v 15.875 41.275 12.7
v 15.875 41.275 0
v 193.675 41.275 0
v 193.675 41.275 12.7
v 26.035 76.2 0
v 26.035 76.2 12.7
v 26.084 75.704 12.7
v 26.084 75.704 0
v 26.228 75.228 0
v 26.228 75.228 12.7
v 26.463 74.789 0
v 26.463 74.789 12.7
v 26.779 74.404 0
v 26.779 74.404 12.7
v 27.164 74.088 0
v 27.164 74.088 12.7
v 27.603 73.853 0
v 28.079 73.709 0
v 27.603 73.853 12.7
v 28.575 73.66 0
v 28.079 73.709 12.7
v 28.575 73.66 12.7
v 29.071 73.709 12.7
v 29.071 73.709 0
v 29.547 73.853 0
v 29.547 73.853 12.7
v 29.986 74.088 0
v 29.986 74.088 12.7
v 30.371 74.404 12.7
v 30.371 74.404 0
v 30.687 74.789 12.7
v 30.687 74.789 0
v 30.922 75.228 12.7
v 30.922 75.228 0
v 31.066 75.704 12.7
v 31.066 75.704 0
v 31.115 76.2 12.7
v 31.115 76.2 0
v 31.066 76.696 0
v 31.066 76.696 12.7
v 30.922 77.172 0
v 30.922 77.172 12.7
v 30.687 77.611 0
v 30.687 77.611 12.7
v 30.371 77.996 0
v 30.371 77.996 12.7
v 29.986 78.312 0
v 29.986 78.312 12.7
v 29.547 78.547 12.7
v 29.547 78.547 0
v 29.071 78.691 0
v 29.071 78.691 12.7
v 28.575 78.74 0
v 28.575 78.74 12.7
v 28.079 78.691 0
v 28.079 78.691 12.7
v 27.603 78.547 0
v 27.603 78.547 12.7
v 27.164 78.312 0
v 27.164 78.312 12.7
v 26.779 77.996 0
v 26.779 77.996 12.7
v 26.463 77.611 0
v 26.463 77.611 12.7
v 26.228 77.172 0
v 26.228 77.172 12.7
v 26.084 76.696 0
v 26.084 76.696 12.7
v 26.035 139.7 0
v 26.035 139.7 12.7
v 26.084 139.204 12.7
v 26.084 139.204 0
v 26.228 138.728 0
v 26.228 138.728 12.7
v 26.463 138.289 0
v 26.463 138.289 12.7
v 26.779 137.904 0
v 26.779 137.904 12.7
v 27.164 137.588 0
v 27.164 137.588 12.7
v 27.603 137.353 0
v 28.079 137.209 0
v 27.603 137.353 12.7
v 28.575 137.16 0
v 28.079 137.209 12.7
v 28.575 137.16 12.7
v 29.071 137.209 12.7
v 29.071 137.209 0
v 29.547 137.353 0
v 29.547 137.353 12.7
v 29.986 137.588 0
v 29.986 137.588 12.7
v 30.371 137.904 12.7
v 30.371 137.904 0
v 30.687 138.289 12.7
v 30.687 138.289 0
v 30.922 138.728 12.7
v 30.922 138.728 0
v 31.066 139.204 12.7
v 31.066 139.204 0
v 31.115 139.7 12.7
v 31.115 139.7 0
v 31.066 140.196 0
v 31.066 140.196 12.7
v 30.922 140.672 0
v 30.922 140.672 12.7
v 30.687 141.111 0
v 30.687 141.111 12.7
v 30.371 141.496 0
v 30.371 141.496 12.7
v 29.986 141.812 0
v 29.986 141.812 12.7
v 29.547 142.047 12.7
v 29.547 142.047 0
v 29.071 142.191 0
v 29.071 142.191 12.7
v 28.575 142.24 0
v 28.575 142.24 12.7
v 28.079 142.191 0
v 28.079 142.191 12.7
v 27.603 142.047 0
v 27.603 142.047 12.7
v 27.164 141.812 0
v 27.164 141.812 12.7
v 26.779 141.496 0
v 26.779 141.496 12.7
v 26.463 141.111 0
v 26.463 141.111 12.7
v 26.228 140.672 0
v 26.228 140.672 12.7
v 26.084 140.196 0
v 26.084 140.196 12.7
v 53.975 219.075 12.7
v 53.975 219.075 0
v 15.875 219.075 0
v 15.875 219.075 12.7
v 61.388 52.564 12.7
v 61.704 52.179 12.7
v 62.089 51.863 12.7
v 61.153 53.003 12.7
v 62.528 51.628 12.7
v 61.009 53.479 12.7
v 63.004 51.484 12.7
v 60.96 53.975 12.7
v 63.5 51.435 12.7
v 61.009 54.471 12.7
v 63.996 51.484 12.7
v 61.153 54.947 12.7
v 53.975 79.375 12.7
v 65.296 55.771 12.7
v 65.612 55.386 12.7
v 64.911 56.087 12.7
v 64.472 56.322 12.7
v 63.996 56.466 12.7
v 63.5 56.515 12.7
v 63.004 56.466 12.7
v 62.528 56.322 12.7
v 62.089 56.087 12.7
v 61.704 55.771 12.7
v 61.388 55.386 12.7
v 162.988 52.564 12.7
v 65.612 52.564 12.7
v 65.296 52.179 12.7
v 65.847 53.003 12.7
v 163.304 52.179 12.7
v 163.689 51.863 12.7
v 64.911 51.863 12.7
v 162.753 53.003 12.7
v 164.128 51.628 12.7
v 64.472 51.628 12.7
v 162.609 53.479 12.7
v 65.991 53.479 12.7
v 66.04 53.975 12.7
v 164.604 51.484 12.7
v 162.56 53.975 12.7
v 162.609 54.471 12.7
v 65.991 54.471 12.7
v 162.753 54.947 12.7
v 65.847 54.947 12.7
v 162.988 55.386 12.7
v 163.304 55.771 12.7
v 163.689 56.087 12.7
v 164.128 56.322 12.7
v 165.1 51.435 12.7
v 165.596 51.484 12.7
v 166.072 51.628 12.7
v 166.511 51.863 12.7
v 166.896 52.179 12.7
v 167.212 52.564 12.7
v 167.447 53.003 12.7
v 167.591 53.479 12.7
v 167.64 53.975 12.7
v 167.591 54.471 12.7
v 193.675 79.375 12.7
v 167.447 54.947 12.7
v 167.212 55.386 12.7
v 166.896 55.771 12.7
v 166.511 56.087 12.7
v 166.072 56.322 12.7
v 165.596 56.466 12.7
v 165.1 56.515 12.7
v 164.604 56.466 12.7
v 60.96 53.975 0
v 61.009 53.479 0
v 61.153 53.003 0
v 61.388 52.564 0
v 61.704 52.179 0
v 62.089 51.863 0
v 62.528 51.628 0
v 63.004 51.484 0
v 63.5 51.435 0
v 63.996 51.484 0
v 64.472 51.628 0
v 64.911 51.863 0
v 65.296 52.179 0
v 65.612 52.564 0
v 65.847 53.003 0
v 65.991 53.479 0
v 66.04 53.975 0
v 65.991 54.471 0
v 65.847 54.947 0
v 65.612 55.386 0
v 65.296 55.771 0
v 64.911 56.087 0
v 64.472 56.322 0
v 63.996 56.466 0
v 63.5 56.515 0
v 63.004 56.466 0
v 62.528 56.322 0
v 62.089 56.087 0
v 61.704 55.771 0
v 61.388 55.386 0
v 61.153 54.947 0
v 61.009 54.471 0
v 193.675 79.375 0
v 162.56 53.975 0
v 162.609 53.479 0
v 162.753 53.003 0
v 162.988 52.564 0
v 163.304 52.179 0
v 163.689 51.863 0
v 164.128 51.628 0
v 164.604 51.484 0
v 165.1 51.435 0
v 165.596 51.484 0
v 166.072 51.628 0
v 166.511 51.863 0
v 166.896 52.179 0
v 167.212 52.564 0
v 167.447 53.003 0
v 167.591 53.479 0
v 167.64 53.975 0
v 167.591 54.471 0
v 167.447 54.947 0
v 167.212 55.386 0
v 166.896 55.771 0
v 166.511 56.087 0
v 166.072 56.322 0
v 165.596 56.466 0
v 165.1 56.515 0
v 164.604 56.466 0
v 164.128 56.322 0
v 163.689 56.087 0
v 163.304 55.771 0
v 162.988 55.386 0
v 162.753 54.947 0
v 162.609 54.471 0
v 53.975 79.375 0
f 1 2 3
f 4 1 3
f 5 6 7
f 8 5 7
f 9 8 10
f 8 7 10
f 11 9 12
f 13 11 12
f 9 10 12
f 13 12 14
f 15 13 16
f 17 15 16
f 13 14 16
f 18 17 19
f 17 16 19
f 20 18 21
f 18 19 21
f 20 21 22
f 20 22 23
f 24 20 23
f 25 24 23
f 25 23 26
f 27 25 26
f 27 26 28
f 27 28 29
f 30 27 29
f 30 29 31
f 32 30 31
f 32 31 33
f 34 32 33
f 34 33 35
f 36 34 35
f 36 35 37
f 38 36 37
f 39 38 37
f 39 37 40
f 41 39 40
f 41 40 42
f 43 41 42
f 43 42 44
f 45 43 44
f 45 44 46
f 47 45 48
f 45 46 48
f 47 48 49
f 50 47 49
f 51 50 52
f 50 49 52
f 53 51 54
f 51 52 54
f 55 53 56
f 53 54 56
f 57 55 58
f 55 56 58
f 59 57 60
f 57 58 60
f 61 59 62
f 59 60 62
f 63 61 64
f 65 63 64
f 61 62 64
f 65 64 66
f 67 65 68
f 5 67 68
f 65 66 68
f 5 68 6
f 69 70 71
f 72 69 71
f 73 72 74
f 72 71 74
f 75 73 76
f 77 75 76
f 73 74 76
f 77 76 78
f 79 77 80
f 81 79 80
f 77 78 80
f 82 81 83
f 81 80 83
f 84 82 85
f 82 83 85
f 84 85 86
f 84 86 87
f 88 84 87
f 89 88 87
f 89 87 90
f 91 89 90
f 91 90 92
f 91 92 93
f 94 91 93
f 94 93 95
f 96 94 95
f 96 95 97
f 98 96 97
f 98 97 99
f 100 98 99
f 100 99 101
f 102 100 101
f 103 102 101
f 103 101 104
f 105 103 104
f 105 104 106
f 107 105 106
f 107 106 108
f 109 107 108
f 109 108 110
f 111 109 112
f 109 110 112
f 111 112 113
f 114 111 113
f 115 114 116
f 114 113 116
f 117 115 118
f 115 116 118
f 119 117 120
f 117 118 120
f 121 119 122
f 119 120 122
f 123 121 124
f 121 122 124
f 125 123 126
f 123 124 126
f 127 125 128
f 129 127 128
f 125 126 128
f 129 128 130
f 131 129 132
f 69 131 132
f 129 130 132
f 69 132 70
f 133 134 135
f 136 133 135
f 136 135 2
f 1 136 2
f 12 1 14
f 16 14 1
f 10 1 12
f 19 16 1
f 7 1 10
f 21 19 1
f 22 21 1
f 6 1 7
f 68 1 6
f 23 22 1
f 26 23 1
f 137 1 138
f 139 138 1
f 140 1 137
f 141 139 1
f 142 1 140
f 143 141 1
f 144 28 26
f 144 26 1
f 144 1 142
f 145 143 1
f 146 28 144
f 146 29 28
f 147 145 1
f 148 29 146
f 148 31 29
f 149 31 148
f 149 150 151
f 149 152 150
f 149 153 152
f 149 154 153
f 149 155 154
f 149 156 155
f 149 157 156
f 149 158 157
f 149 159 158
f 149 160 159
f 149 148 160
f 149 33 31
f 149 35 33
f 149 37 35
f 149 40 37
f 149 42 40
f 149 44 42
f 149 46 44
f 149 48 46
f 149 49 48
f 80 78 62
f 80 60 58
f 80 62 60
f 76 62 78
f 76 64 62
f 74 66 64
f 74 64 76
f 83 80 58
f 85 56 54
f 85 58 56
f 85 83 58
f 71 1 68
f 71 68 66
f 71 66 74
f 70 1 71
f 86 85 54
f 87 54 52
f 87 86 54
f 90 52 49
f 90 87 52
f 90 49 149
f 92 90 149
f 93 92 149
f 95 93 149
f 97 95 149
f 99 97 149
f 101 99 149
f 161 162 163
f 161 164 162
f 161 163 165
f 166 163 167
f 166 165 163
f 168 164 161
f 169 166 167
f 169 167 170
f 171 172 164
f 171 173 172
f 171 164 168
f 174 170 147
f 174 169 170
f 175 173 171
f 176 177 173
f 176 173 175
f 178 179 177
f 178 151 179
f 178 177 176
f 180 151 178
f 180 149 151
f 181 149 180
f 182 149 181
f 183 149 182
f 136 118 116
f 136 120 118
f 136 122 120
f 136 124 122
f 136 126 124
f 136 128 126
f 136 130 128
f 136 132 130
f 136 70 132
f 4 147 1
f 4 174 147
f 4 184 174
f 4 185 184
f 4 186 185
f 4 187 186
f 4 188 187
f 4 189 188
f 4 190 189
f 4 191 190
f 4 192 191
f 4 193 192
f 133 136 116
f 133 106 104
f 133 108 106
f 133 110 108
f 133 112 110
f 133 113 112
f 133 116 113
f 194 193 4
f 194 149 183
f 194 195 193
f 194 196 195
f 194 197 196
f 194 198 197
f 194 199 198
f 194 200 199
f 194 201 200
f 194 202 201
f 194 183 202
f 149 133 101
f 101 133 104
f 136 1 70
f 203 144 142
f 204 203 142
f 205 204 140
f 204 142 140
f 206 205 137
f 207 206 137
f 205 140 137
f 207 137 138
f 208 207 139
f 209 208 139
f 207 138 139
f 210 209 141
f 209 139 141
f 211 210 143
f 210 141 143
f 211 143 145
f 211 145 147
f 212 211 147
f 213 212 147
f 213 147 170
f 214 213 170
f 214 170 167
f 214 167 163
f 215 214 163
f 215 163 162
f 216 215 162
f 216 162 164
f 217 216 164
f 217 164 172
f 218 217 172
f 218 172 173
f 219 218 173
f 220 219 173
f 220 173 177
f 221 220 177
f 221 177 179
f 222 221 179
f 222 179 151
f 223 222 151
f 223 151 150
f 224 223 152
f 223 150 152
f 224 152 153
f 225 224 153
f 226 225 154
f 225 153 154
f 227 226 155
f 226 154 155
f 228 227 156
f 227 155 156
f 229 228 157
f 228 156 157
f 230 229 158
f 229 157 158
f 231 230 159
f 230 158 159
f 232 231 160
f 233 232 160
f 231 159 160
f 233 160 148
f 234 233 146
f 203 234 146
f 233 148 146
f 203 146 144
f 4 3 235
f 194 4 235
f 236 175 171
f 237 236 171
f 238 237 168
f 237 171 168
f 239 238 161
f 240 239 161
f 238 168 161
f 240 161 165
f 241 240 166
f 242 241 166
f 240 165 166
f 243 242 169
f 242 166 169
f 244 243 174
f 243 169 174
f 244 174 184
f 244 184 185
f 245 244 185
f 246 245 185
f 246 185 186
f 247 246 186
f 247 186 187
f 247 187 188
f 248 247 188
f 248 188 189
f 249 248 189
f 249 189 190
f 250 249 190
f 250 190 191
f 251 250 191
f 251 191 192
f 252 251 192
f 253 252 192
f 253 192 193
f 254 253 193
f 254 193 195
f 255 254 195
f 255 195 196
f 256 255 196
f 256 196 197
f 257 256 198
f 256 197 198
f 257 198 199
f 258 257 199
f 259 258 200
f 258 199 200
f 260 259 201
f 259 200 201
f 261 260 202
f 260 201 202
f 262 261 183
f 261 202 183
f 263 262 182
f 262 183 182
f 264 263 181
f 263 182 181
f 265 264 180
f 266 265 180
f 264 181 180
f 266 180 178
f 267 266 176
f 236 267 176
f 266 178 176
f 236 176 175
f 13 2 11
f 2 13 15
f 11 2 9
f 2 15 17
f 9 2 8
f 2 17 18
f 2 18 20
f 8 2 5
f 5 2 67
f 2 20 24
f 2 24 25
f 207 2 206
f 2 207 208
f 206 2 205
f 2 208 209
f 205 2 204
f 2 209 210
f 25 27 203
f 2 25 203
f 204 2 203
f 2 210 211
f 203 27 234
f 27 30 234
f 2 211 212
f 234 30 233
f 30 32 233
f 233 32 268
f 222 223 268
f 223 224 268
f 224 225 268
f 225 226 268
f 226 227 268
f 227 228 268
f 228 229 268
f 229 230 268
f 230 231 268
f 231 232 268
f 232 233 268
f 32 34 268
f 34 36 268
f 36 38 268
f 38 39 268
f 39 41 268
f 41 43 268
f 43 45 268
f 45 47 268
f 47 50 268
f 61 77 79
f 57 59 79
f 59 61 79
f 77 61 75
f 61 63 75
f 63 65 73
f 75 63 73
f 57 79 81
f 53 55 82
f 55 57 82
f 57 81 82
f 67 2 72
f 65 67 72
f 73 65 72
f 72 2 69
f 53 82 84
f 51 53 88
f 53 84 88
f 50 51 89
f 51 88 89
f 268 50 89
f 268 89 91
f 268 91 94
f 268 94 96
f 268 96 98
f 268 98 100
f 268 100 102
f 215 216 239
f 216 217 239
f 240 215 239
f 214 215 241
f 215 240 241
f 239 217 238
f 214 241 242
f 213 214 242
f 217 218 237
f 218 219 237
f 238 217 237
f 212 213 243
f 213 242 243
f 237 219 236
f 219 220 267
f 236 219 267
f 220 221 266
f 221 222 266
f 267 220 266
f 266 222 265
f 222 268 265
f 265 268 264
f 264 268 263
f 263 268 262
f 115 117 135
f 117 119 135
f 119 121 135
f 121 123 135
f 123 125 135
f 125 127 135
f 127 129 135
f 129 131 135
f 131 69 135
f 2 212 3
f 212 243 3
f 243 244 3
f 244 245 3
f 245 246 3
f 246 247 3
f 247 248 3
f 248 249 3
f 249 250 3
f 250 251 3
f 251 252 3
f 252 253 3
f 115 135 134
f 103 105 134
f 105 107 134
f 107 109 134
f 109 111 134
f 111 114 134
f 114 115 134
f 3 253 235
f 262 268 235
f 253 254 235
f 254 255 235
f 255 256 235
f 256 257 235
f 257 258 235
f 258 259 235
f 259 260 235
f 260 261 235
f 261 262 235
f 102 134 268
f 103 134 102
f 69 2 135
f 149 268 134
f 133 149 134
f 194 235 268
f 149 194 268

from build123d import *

# Parameters (mm, degrees)
F1_DEPTH = 12.7
F2_D     = 5.08


with BuildPart() as f1:
    # F0 (on Top) → F1 (new body)
    with BuildSketch(Plane.XY):
        Polygon((193.675, 79.375), (53.975, 79.375), (53.975, 219.075), (15.875, 219.075), (15.875, 41.275), (193.675, 41.275), align=None)
    extrude(amount=F1_DEPTH)

    # F2 (through all)
    with Locations(Plane(origin=(0, 0, 0), x_dir=(1, 0, 0), z_dir=(0, 0, -1))):
        with Locations((28.575, -139.7), (28.575, -76.2), (63.5, -53.975), (165.1, -53.975)):
            Hole(F2_D / 2)


solid = f1.part
